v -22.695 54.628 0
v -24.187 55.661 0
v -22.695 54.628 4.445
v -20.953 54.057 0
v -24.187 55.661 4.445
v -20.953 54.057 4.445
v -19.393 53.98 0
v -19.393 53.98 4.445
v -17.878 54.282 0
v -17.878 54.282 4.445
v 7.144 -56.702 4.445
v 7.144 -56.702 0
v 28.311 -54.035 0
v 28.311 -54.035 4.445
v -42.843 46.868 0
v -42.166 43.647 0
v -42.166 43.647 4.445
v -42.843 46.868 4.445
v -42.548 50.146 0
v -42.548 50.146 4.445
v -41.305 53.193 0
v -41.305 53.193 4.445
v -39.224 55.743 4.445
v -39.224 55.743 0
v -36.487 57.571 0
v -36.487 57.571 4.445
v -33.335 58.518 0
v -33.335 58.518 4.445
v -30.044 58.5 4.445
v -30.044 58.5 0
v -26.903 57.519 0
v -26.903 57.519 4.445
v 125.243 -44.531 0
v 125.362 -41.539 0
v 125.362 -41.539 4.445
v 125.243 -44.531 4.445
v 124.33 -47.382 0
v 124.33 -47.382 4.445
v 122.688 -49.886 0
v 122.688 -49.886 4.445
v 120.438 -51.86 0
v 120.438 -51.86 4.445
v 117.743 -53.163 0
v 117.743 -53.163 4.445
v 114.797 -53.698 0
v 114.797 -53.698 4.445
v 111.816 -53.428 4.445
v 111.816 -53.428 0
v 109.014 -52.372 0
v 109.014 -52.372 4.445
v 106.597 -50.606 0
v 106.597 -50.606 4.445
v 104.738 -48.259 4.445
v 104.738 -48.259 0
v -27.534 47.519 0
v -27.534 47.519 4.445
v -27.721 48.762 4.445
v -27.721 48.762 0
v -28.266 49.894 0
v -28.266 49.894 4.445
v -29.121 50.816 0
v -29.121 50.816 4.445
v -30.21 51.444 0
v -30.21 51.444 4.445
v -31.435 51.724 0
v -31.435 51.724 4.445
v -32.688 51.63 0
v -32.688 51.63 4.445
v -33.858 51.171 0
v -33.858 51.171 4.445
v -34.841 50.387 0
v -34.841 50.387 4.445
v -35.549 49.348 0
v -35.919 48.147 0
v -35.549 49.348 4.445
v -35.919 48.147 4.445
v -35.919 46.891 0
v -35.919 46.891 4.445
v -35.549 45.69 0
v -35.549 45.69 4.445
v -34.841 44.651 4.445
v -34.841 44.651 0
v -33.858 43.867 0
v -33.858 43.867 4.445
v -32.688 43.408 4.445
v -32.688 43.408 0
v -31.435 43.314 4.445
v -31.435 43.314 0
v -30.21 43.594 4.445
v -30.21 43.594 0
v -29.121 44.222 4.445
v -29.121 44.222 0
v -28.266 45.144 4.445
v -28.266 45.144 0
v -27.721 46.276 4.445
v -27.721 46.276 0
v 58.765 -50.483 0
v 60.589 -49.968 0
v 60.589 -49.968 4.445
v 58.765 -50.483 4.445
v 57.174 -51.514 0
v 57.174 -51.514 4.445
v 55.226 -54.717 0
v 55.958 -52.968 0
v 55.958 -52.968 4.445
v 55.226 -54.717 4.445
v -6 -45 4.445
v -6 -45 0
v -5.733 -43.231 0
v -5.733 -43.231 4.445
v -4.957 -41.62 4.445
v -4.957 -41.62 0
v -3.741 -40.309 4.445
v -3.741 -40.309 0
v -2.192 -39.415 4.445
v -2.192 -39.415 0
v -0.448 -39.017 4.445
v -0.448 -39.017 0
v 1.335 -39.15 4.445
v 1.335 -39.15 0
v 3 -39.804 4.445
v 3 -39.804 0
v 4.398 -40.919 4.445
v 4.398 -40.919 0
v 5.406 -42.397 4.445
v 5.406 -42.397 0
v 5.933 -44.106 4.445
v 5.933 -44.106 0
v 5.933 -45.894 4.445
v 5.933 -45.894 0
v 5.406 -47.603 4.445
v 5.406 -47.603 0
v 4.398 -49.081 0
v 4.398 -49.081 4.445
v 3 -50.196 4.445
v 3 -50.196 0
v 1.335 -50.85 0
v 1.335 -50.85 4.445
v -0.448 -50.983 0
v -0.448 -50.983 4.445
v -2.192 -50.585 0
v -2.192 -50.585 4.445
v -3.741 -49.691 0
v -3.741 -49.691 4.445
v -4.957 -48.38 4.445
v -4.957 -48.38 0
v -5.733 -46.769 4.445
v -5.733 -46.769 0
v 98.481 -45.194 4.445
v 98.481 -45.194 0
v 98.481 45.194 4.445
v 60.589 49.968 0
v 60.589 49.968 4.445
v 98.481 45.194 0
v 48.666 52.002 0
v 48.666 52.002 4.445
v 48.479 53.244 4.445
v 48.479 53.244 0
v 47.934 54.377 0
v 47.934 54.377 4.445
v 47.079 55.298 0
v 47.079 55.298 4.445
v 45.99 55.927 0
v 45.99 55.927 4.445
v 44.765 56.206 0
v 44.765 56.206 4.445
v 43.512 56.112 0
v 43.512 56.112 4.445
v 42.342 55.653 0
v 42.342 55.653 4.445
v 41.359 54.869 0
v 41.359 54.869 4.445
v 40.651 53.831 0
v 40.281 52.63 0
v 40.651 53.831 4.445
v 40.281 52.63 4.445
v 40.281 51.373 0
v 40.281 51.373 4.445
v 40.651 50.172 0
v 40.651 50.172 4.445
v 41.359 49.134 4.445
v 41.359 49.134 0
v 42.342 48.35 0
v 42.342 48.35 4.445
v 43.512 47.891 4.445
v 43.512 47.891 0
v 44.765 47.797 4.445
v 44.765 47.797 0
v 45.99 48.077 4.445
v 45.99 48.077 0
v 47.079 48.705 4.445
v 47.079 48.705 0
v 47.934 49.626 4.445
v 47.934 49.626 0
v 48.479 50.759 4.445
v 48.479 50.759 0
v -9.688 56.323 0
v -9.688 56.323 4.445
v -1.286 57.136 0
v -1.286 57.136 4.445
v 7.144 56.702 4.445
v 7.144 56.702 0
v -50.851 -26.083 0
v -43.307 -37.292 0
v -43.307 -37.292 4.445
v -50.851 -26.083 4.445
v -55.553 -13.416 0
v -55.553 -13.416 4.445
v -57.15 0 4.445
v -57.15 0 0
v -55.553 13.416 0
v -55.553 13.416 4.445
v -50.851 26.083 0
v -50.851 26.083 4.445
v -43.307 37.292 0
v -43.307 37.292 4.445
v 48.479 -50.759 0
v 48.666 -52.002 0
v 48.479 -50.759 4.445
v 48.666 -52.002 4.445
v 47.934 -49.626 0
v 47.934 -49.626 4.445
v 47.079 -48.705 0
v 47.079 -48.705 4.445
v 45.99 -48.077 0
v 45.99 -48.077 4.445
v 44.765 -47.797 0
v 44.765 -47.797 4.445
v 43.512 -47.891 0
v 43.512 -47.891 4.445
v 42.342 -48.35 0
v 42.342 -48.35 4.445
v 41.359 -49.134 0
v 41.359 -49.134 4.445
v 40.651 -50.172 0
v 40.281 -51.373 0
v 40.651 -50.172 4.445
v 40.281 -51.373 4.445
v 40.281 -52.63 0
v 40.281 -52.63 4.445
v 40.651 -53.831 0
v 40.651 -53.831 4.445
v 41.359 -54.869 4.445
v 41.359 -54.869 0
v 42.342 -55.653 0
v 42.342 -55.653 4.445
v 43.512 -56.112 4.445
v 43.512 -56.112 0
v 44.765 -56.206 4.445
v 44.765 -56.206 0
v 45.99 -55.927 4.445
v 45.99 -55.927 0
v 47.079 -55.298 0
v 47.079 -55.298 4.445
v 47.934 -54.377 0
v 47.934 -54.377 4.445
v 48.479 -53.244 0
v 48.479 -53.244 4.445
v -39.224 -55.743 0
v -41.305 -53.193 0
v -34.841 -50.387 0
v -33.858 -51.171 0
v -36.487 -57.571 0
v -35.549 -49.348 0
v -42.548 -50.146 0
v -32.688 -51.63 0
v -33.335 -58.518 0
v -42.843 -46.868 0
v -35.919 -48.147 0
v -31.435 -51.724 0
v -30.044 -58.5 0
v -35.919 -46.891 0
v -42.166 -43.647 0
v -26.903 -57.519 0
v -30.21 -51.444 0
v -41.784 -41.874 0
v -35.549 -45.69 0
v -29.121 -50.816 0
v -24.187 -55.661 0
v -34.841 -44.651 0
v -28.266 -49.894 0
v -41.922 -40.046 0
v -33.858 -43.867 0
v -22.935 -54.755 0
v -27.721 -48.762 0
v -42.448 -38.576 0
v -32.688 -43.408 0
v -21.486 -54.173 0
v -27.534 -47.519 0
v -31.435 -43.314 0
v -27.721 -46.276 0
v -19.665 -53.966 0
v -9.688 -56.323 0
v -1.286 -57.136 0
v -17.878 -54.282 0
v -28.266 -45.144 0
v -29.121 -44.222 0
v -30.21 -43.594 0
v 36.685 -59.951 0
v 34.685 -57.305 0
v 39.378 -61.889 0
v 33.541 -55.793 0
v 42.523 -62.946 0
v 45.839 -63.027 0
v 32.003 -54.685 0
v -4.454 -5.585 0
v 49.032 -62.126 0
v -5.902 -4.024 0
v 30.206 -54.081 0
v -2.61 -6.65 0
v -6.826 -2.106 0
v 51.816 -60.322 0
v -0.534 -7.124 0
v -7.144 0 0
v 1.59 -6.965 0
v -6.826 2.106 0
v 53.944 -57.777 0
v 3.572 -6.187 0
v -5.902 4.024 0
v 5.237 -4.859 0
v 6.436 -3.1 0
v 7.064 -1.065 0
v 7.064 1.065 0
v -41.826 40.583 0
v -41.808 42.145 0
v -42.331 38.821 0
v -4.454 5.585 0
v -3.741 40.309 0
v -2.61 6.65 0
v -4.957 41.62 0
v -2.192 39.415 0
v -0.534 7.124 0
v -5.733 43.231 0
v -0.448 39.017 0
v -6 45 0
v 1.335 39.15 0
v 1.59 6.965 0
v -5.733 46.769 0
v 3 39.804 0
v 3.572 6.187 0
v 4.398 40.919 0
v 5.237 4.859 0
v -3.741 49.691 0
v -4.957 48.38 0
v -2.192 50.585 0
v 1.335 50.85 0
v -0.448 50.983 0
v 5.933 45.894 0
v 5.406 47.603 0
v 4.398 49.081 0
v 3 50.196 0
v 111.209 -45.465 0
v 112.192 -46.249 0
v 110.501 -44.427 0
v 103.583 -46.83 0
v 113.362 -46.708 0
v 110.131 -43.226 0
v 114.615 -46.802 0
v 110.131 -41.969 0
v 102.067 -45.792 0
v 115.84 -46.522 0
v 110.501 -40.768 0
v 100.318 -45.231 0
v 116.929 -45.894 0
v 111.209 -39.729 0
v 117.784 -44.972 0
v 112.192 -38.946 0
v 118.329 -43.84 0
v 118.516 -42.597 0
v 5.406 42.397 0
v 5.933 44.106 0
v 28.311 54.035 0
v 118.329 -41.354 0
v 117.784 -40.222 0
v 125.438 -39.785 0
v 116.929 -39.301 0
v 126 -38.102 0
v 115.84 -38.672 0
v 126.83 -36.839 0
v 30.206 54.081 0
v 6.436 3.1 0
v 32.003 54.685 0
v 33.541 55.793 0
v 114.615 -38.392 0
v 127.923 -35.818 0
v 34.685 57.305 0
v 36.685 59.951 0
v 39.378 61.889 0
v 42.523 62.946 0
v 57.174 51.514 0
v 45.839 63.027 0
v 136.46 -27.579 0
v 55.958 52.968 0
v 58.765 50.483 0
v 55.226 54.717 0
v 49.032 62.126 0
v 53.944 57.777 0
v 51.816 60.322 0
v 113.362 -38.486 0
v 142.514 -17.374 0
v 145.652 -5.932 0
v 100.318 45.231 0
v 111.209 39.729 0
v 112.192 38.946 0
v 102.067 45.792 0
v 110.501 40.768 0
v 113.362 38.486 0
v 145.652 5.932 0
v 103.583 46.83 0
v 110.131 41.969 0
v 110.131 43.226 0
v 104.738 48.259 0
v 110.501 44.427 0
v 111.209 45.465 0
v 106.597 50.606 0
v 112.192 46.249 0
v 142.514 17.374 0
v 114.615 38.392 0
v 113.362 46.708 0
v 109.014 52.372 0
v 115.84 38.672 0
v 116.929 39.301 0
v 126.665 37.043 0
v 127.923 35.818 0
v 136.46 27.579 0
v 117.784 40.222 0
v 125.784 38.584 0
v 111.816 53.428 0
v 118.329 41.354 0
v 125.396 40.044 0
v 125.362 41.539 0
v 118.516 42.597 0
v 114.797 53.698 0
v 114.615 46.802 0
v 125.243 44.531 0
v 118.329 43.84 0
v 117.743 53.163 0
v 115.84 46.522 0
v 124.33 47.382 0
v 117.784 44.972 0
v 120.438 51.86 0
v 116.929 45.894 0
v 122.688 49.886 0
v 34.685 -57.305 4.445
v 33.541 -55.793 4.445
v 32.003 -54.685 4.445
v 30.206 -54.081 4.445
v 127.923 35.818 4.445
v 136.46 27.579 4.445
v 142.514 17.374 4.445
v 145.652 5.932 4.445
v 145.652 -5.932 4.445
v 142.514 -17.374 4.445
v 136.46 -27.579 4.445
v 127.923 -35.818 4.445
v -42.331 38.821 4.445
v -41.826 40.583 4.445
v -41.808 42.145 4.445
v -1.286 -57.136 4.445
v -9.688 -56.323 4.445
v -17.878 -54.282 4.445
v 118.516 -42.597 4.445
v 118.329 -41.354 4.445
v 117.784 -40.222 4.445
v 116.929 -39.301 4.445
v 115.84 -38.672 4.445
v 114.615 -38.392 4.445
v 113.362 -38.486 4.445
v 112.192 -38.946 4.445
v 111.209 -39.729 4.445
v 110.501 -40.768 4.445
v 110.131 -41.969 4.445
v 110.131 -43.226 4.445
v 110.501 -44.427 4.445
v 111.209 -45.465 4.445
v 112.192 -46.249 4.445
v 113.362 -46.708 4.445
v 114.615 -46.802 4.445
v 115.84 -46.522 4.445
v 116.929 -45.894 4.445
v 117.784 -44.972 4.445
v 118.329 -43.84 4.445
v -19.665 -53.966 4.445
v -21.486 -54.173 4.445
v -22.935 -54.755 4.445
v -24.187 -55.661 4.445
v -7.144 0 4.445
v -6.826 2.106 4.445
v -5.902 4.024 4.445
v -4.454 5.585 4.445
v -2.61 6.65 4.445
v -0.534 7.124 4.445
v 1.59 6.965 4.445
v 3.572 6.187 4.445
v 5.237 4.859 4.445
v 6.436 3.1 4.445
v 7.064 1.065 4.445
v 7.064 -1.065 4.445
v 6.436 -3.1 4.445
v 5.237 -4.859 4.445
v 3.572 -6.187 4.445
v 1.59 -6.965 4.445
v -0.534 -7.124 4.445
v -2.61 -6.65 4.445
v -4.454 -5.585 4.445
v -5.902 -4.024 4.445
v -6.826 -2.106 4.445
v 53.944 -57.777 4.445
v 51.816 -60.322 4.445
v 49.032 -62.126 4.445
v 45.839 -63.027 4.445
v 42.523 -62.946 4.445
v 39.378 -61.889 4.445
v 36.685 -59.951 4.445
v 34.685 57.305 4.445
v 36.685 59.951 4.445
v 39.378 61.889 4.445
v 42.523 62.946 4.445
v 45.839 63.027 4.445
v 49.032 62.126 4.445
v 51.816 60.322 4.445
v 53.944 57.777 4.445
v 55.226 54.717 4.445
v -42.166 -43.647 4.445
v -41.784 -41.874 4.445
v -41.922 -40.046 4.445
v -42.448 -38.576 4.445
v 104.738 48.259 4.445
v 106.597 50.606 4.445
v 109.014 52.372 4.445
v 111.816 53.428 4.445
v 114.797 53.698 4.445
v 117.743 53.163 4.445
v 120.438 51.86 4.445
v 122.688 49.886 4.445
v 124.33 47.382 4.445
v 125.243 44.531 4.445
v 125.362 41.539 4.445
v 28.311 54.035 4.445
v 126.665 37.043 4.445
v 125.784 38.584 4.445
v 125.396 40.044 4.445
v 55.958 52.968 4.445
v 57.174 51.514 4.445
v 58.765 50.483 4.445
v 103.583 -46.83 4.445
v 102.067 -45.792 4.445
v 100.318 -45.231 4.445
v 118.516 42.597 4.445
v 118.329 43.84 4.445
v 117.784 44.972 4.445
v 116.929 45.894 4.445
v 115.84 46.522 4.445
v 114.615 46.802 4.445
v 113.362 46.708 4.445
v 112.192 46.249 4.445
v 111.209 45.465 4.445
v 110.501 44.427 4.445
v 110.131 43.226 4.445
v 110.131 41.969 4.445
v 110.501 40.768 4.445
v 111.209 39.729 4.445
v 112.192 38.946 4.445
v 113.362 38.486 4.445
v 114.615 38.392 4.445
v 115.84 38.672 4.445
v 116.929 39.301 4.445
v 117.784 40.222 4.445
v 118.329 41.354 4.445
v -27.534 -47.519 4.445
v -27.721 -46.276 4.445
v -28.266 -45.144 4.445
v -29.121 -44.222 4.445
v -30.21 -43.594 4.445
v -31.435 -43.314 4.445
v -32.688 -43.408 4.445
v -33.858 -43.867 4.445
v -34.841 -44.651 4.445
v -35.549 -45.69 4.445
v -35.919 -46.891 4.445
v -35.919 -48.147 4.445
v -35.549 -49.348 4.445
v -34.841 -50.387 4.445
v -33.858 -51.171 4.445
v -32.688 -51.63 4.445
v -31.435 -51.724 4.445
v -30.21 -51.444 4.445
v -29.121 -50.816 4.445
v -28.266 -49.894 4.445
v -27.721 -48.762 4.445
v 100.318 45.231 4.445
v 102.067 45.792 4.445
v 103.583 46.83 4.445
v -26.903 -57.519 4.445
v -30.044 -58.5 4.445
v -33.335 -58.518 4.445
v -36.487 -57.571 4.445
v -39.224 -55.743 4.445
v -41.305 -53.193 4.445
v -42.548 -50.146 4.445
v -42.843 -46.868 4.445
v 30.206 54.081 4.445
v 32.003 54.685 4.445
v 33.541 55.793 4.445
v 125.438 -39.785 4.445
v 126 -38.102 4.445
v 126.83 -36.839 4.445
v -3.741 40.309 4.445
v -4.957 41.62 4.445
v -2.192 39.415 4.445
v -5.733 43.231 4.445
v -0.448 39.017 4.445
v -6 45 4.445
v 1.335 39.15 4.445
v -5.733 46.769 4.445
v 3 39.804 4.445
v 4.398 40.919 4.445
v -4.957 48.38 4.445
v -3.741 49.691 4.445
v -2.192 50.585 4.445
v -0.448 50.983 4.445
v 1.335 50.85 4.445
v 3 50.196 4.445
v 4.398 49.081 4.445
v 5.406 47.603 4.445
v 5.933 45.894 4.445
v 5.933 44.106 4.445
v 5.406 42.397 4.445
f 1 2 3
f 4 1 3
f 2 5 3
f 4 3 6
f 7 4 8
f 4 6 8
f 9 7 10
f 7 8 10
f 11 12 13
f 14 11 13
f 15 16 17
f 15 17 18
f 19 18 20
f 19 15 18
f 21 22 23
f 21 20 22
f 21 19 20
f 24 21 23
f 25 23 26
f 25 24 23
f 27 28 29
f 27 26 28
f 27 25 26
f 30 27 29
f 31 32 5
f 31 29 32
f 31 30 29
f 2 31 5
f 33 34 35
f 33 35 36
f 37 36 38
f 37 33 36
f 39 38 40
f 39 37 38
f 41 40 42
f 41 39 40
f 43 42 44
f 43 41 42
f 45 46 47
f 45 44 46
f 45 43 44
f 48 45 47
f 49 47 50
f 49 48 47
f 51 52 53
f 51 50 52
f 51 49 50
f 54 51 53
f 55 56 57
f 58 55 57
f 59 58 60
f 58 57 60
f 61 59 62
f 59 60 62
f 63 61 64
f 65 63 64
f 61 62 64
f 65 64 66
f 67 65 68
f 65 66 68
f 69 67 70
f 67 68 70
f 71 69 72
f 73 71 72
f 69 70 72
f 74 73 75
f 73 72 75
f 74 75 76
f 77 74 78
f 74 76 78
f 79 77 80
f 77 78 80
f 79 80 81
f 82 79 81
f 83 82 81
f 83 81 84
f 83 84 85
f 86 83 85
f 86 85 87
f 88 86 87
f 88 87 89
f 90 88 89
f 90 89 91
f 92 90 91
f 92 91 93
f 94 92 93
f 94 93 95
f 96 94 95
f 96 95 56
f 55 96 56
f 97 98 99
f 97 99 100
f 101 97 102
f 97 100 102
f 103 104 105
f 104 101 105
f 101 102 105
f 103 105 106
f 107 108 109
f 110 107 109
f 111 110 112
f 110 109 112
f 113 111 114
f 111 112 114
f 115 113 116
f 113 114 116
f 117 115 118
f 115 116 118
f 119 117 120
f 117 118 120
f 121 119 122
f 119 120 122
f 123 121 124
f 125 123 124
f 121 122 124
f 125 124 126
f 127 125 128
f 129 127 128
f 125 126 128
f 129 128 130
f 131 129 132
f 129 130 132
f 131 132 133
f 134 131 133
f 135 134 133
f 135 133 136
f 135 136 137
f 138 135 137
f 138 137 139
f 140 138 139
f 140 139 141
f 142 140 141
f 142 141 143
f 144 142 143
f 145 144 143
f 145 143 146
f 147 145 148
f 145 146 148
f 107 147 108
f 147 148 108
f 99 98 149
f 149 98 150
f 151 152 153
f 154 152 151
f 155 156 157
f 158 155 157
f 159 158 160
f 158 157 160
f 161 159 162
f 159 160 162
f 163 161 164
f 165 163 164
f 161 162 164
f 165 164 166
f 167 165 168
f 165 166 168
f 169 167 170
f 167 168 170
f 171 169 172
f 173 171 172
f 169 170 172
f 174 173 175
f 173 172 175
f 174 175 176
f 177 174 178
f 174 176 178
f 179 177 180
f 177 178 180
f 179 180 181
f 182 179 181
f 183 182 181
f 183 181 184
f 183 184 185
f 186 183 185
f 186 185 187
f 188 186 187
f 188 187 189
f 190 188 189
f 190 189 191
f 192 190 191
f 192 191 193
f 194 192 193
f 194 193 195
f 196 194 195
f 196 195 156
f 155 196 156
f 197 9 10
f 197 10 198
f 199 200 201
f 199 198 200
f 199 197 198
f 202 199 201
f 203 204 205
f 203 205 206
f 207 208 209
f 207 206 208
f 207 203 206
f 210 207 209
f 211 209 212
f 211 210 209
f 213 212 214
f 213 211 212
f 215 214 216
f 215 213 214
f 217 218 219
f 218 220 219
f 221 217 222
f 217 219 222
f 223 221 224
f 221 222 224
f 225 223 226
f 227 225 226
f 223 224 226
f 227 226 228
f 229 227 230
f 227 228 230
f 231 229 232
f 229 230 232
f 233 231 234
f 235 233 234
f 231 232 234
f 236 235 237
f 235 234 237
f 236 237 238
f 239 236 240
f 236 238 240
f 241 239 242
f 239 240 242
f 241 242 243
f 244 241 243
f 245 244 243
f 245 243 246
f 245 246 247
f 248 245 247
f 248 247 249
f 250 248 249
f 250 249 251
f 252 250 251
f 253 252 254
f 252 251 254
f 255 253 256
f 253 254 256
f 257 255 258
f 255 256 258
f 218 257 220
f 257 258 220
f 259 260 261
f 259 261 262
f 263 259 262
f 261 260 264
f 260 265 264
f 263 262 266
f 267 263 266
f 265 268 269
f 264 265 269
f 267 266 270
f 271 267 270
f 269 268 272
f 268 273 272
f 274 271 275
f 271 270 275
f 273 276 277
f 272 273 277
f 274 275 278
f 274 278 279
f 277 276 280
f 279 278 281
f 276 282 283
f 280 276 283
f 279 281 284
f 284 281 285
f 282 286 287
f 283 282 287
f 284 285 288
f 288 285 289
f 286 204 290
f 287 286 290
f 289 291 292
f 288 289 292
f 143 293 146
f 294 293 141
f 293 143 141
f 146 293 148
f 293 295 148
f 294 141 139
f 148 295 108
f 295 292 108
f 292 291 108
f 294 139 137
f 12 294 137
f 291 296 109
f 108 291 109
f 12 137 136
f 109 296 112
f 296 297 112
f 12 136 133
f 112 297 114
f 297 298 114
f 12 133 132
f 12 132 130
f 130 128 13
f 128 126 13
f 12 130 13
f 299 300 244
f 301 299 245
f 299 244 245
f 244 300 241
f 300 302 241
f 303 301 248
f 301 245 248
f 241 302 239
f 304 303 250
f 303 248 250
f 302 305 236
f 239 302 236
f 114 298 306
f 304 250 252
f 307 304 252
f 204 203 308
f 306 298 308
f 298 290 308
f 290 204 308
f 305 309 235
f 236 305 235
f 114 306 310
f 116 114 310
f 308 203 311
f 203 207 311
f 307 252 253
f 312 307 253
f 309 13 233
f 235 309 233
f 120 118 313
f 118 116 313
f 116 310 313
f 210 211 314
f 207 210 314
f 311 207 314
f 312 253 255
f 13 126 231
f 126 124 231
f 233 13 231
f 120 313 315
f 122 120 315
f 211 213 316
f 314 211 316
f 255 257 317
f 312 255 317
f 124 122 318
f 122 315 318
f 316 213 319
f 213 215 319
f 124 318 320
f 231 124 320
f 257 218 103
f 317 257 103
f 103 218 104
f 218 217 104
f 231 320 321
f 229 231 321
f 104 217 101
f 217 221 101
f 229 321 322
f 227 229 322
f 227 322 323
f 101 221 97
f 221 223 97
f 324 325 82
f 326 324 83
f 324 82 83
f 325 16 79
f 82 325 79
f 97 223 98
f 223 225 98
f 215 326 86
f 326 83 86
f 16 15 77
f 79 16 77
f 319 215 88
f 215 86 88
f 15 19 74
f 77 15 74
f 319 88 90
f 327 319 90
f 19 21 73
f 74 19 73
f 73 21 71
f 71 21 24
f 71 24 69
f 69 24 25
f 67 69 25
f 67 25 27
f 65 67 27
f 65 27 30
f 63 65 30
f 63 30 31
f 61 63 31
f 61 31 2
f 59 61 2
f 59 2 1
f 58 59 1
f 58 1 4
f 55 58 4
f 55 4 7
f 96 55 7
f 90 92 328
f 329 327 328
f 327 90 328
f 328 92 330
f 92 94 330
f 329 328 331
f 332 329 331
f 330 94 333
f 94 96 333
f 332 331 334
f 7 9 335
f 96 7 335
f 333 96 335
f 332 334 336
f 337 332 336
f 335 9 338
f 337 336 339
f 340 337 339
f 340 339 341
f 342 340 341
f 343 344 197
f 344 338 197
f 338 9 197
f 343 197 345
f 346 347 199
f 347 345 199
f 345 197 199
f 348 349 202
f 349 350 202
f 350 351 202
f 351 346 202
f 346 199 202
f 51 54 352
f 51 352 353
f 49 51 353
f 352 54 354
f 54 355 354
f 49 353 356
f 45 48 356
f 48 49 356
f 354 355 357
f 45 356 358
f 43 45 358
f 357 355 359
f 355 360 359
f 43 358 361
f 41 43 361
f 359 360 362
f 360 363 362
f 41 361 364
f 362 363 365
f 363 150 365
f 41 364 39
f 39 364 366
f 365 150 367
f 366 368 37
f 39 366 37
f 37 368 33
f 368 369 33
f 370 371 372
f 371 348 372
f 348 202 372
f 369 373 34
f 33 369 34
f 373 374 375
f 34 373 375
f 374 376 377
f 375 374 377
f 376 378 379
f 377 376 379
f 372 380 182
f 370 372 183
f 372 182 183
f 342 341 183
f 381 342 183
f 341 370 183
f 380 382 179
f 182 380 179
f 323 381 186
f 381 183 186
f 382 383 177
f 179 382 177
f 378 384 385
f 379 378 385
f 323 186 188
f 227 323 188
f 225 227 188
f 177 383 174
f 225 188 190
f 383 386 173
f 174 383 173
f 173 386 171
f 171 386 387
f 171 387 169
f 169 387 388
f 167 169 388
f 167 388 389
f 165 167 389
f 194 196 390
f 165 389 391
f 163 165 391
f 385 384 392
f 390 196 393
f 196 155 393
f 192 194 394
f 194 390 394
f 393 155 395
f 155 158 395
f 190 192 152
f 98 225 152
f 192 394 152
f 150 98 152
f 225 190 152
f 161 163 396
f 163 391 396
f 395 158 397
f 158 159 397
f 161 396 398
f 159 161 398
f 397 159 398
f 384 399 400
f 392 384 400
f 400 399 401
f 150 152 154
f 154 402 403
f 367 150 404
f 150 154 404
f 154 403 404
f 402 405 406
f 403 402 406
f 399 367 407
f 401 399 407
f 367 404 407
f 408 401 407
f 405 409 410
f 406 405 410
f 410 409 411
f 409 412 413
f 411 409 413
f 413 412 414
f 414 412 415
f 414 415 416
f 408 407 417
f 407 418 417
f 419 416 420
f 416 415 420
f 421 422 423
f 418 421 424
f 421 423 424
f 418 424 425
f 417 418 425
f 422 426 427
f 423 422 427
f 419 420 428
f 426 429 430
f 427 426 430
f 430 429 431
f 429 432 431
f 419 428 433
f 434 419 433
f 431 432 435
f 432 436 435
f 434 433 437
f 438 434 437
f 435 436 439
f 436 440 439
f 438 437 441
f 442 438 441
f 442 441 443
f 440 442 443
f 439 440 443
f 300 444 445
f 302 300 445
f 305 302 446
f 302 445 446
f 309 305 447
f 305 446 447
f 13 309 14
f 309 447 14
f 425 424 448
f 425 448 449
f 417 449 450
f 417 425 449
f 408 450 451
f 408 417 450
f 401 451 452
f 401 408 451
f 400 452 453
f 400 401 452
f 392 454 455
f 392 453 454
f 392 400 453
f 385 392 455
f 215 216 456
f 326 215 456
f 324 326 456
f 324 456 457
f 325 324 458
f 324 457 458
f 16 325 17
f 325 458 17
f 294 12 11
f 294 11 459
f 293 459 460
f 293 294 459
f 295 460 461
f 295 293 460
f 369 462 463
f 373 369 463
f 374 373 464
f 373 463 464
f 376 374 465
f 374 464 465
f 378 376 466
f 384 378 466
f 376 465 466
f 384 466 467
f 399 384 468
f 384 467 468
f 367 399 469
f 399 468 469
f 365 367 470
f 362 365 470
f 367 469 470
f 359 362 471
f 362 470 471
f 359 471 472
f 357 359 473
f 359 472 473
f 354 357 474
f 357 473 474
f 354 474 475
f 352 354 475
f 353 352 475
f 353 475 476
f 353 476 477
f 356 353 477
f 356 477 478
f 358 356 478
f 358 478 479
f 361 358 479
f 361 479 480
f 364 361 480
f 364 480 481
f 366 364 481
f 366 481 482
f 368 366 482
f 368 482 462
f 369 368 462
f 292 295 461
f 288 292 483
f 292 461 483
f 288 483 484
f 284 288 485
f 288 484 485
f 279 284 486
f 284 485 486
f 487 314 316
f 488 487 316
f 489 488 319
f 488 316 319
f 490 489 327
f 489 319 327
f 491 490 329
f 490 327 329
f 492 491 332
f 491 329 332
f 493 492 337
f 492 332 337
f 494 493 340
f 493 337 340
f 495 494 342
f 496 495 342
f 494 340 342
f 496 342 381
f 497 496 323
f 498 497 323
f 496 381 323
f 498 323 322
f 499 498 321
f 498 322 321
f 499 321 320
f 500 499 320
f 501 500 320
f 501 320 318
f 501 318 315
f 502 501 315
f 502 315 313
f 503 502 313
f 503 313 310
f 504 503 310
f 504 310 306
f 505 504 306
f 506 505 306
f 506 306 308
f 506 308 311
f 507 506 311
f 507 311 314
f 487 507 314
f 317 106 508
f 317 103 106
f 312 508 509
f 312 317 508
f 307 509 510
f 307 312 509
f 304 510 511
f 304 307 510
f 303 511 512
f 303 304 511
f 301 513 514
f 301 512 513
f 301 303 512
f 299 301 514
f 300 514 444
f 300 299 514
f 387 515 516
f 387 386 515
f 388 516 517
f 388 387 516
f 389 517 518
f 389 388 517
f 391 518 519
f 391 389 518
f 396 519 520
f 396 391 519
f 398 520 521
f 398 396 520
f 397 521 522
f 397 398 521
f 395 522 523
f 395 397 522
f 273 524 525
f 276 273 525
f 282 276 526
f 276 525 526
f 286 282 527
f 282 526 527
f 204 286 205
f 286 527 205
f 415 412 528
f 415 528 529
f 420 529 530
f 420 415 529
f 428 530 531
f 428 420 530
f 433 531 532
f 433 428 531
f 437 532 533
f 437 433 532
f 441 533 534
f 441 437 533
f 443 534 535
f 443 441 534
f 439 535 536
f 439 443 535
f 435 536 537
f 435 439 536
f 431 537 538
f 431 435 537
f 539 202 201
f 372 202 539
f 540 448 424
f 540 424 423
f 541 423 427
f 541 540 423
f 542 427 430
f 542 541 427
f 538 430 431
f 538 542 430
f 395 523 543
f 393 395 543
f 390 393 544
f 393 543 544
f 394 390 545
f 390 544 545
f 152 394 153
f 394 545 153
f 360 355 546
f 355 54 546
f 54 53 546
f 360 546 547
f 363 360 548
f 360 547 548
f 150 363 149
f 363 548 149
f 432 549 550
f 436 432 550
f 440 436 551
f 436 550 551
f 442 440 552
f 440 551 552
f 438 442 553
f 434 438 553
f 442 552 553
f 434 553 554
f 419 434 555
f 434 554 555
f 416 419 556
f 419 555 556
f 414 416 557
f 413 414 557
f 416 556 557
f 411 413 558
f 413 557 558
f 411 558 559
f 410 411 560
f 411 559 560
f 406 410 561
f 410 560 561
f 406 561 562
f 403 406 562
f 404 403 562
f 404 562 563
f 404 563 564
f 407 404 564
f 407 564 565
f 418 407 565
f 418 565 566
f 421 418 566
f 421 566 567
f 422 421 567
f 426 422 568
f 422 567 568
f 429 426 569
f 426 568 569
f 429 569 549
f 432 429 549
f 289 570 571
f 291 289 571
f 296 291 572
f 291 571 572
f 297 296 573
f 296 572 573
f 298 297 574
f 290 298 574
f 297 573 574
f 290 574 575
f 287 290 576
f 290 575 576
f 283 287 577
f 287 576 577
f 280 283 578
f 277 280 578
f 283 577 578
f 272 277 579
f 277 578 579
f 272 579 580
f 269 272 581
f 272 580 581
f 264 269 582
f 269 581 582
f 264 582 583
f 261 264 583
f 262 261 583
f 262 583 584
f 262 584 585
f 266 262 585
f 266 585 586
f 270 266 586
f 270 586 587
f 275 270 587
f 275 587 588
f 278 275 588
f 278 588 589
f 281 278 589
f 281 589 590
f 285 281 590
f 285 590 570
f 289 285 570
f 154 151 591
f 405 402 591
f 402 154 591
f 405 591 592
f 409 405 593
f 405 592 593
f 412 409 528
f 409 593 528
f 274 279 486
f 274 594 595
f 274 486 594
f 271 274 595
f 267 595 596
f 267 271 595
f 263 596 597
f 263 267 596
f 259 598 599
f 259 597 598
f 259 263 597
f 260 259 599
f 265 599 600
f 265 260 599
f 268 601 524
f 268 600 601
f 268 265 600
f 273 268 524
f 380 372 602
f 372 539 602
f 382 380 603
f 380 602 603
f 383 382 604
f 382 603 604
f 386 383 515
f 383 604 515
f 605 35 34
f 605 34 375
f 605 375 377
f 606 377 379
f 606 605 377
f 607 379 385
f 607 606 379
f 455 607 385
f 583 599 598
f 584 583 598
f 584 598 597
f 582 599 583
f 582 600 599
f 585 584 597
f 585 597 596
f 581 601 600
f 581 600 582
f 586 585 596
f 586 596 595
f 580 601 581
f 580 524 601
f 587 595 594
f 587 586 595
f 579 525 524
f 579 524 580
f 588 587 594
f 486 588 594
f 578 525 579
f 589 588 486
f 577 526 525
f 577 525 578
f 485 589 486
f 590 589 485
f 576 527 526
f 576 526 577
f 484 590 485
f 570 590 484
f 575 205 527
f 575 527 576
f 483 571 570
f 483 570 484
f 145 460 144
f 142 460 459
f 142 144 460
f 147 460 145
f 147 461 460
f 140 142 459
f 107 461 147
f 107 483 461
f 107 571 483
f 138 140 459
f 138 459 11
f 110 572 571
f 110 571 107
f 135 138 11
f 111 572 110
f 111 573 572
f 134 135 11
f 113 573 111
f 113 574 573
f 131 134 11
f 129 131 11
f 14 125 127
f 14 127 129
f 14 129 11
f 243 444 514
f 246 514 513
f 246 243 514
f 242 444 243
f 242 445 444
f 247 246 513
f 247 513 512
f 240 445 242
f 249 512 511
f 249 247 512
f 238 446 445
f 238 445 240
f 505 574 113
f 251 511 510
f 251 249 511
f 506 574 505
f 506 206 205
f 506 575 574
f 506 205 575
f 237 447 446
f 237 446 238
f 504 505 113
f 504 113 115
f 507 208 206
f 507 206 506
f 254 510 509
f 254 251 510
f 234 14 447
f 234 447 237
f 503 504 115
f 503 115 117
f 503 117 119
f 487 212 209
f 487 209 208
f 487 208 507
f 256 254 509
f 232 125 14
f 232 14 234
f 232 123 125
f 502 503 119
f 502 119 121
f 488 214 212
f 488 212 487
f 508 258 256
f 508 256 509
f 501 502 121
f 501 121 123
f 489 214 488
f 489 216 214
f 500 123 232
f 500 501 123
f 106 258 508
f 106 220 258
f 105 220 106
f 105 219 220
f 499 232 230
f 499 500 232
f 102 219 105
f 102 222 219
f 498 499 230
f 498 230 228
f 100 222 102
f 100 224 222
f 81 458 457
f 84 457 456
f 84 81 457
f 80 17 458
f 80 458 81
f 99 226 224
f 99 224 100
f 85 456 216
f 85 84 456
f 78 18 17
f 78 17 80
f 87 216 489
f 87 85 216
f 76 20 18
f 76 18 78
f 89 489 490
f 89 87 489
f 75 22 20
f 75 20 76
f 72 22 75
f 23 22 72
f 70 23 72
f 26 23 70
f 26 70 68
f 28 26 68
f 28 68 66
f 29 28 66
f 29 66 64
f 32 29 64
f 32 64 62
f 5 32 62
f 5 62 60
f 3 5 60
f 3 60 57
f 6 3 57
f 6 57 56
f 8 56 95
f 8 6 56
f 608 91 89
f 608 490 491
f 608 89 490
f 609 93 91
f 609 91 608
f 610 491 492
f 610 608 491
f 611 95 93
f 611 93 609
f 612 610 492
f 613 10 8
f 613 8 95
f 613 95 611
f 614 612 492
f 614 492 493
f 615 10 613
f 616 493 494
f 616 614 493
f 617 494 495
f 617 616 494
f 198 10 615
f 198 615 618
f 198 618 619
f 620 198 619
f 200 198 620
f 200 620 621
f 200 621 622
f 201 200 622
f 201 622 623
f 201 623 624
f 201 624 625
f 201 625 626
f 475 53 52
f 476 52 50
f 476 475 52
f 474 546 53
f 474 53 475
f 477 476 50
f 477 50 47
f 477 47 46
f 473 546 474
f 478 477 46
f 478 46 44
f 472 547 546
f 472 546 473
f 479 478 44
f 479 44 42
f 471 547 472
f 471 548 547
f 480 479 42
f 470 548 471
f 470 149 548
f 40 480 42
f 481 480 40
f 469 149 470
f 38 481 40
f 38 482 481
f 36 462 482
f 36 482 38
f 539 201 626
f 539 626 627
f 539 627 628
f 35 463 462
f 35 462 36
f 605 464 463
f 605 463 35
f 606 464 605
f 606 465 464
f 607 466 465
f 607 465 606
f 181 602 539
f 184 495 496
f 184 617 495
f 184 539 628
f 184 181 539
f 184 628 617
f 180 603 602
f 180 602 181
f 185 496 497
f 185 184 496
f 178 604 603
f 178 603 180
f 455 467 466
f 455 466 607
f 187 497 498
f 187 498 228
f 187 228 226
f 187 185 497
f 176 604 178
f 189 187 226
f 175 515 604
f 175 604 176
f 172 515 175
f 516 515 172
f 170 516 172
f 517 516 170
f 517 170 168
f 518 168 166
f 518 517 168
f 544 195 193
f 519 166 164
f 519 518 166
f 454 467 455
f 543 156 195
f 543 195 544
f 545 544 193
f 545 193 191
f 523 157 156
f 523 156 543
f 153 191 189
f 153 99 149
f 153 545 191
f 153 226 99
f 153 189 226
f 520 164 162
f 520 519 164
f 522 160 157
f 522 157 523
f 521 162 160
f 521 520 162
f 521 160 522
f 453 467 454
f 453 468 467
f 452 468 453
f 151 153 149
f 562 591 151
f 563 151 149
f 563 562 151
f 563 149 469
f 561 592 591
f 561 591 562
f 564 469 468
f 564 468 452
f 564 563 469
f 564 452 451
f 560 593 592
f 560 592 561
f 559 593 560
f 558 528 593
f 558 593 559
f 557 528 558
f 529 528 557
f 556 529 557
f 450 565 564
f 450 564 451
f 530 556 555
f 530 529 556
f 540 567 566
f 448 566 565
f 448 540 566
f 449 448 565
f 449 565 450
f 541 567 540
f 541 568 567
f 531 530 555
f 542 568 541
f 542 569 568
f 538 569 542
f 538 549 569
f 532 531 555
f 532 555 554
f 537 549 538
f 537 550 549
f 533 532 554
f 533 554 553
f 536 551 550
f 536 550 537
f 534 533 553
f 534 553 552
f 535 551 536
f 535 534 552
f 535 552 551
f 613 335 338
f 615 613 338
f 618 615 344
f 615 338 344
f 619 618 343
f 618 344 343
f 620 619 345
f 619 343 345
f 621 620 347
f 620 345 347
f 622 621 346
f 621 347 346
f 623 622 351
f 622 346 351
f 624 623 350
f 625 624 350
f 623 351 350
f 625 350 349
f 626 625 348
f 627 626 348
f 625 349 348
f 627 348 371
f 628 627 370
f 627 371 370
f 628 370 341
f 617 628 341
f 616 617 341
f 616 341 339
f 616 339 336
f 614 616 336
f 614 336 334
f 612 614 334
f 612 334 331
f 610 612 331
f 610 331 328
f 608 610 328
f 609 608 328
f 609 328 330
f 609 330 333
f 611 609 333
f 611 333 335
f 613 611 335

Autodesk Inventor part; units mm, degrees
ref_plane "YZ Plane" through (0, 0, 0) normal (1, 0, 0) x (0, 1, 0)
ref_plane "XZ Plane" through (0, 0, 0) normal (0, 1, 0) x (-1, 0, 0)
ref_plane "XY Plane" through (0, 0, 0) normal (0, 0, 1) x (1, 0, 0)
sketch "Boceto1" plane through (0, 0, 0) normal (0, 0, 1) x (1, 0, 0)
  circle A0 centre (0, 0) radius 57.15
  circle A1 centre (101.6, 0) radius 44.45
  circle A2 centre (-31.75, 47.519) radius 11.1125
  circle A3 centre (-31.75, -47.519) radius 11.1125
  circle A4 centre (114.3, 42.5971) radius 11.1125
  circle A5 centre (114.3, -42.5971) radius 11.1125
  line L0 (7.1437, 56.7018) -> (107.1562, 44.1014)
  circle A6 centre (44.45, 52.0016) radius 11.1125
  line L1 (7.1437, -56.7018) -> (107.1562, -44.1014)
  circle A7 centre (44.45, -52.0016) radius 11.1125
  dimension "d0" = 114.3
  dimension "d1" = 88.9
  dimension "d2" = 203.2
  dimension "d3" = 22.225
  dimension "d4" = 22.225
  dimension "d7" = 22.225
  dimension "d8" = 22.225
  dimension "d11" = 22.225
  dimension "d13" = 0
  dimension "d14" = 22.225
  dimension "d27" = 12.7
  dimension "d28" = 12.7
  dimension "d29" = 44.45
  dimension "d30" = 44.45
  dimension "d31" = 31.75
  dimension "d32" = 31.75
extrude "Extrusión1" add sketch "Boceto1" along normal blind 4.445
sketch "Boceto2" plane through (0, 0, 4.445) normal (0, 0, 1) x (1, 0, 0)
  arc A0 (-21.9537, 52.7651) -> (-40.3458, 40.4764) centre (-31.75, 47.519) ccw projected
  circle A1 centre (-31.75, 47.519) radius 4.2164
  arc A2 (-40.3458, -40.4764) -> (-21.9537, -52.7651) centre (-31.75, -47.519) ccw projected
  circle A3 centre (-31.75, -47.519) radius 4.2164
  arc A4 (33.4247, -53.3907) -> (55.4753, -50.6125) centre (44.45, -52.0016) ccw projected
  circle A5 centre (44.45, -52.0016) radius 4.2164
  arc A6 (55.4753, 50.6125) -> (33.4247, 53.3907) centre (44.45, 52.0016) ccw projected
  circle A7 centre (44.45, 52.0016) radius 4.2164
  arc A8 (124.4689, 38.1158) -> (103.3657, 44.5789) centre (114.3, 42.5971) ccw projected
  circle A9 centre (114.3, 42.5971) radius 4.2164
  arc A10 (103.3657, -44.5789) -> (124.4689, -38.1158) centre (114.3, -42.5971) ccw projected
  circle A11 centre (114.3, -42.5971) radius 4.2164
  point P0 (0, 0)
  dimension "d18" = 8.4328
  dimension "d19" = 8.4328
  dimension "d20" = 8.4328
  dimension "d21" = 8.4328
  dimension "d22" = 8.4328
  dimension "d23" = 8.4328
extrude "Extrusión2" cut sketch "Boceto2" against normal up to surface (4.445 mm away)
fillet "Empalme1" radius 6.35 12 edges at (-21.9537, -52.7651, 2.2225) (-40.3458, -40.4764, 2.2225) (33.4247, -53.3907, 2.2225) (55.4753, -50.6125, 2.2225) (124.4689, -38.1158, 2.2225) (-40.3458, 40.4764, 2.2225) (-21.9537, 52.7651, 2.2225) (33.4247, 53.3907, 2.2225) (55.4753, 50.6125, 2.2225) (103.3657, 44.5789, 2.2225) (124.4689, 38.1158, 2.2225) (103.3657, -44.5789, 2.2225)
sketch "Boceto3" plane through (0, 0, 0) normal (0, 0, -1) x (-1, 0, 0)
  circle A0 centre (0, 0) radius 7.1437
  circle A1 centre (0, -45) radius 6
  circle A2 centre (0, 45) radius 6
  line L0 (0, -45) -> (0, 0)
  line L1 (0, 0) -> (0, 45)
  dimension "d33" = 14.2875
  dimension "d34" = 12
  dimension "d35" = 12
  dimension "d36" = 45
  dimension "d37" = 45
extrude "Extrusión3" cut sketch "Boceto3" against normal up to surface (4.445 mm away)
equation "\"d16\" = t"
equation "\"d18\" = Q"
equation "\"d19\" = Q"
equation "\"d20\" = Q"
equation "\"d21\" = Q"
equation "\"d22\" = Q"
equation "\"d23\" = Q"
equation "\"d33\" = DF"
equation "\"d34\" = NF"
equation "\"d35\" = NF"
equation "\"d36\" = 0.5 * JF"
equation "\"d37\" = 0.5 * JF"
equation "\"t\" = 4.445"
equation "\"Q\" = 8.4328"
equation "\"DF\" = 14.2875"
equation "\"NF\" = 12"
equation "\"JF\" = 90"
properties part number "STEEL SIDE REDUCTION COUNTER PLATE"
